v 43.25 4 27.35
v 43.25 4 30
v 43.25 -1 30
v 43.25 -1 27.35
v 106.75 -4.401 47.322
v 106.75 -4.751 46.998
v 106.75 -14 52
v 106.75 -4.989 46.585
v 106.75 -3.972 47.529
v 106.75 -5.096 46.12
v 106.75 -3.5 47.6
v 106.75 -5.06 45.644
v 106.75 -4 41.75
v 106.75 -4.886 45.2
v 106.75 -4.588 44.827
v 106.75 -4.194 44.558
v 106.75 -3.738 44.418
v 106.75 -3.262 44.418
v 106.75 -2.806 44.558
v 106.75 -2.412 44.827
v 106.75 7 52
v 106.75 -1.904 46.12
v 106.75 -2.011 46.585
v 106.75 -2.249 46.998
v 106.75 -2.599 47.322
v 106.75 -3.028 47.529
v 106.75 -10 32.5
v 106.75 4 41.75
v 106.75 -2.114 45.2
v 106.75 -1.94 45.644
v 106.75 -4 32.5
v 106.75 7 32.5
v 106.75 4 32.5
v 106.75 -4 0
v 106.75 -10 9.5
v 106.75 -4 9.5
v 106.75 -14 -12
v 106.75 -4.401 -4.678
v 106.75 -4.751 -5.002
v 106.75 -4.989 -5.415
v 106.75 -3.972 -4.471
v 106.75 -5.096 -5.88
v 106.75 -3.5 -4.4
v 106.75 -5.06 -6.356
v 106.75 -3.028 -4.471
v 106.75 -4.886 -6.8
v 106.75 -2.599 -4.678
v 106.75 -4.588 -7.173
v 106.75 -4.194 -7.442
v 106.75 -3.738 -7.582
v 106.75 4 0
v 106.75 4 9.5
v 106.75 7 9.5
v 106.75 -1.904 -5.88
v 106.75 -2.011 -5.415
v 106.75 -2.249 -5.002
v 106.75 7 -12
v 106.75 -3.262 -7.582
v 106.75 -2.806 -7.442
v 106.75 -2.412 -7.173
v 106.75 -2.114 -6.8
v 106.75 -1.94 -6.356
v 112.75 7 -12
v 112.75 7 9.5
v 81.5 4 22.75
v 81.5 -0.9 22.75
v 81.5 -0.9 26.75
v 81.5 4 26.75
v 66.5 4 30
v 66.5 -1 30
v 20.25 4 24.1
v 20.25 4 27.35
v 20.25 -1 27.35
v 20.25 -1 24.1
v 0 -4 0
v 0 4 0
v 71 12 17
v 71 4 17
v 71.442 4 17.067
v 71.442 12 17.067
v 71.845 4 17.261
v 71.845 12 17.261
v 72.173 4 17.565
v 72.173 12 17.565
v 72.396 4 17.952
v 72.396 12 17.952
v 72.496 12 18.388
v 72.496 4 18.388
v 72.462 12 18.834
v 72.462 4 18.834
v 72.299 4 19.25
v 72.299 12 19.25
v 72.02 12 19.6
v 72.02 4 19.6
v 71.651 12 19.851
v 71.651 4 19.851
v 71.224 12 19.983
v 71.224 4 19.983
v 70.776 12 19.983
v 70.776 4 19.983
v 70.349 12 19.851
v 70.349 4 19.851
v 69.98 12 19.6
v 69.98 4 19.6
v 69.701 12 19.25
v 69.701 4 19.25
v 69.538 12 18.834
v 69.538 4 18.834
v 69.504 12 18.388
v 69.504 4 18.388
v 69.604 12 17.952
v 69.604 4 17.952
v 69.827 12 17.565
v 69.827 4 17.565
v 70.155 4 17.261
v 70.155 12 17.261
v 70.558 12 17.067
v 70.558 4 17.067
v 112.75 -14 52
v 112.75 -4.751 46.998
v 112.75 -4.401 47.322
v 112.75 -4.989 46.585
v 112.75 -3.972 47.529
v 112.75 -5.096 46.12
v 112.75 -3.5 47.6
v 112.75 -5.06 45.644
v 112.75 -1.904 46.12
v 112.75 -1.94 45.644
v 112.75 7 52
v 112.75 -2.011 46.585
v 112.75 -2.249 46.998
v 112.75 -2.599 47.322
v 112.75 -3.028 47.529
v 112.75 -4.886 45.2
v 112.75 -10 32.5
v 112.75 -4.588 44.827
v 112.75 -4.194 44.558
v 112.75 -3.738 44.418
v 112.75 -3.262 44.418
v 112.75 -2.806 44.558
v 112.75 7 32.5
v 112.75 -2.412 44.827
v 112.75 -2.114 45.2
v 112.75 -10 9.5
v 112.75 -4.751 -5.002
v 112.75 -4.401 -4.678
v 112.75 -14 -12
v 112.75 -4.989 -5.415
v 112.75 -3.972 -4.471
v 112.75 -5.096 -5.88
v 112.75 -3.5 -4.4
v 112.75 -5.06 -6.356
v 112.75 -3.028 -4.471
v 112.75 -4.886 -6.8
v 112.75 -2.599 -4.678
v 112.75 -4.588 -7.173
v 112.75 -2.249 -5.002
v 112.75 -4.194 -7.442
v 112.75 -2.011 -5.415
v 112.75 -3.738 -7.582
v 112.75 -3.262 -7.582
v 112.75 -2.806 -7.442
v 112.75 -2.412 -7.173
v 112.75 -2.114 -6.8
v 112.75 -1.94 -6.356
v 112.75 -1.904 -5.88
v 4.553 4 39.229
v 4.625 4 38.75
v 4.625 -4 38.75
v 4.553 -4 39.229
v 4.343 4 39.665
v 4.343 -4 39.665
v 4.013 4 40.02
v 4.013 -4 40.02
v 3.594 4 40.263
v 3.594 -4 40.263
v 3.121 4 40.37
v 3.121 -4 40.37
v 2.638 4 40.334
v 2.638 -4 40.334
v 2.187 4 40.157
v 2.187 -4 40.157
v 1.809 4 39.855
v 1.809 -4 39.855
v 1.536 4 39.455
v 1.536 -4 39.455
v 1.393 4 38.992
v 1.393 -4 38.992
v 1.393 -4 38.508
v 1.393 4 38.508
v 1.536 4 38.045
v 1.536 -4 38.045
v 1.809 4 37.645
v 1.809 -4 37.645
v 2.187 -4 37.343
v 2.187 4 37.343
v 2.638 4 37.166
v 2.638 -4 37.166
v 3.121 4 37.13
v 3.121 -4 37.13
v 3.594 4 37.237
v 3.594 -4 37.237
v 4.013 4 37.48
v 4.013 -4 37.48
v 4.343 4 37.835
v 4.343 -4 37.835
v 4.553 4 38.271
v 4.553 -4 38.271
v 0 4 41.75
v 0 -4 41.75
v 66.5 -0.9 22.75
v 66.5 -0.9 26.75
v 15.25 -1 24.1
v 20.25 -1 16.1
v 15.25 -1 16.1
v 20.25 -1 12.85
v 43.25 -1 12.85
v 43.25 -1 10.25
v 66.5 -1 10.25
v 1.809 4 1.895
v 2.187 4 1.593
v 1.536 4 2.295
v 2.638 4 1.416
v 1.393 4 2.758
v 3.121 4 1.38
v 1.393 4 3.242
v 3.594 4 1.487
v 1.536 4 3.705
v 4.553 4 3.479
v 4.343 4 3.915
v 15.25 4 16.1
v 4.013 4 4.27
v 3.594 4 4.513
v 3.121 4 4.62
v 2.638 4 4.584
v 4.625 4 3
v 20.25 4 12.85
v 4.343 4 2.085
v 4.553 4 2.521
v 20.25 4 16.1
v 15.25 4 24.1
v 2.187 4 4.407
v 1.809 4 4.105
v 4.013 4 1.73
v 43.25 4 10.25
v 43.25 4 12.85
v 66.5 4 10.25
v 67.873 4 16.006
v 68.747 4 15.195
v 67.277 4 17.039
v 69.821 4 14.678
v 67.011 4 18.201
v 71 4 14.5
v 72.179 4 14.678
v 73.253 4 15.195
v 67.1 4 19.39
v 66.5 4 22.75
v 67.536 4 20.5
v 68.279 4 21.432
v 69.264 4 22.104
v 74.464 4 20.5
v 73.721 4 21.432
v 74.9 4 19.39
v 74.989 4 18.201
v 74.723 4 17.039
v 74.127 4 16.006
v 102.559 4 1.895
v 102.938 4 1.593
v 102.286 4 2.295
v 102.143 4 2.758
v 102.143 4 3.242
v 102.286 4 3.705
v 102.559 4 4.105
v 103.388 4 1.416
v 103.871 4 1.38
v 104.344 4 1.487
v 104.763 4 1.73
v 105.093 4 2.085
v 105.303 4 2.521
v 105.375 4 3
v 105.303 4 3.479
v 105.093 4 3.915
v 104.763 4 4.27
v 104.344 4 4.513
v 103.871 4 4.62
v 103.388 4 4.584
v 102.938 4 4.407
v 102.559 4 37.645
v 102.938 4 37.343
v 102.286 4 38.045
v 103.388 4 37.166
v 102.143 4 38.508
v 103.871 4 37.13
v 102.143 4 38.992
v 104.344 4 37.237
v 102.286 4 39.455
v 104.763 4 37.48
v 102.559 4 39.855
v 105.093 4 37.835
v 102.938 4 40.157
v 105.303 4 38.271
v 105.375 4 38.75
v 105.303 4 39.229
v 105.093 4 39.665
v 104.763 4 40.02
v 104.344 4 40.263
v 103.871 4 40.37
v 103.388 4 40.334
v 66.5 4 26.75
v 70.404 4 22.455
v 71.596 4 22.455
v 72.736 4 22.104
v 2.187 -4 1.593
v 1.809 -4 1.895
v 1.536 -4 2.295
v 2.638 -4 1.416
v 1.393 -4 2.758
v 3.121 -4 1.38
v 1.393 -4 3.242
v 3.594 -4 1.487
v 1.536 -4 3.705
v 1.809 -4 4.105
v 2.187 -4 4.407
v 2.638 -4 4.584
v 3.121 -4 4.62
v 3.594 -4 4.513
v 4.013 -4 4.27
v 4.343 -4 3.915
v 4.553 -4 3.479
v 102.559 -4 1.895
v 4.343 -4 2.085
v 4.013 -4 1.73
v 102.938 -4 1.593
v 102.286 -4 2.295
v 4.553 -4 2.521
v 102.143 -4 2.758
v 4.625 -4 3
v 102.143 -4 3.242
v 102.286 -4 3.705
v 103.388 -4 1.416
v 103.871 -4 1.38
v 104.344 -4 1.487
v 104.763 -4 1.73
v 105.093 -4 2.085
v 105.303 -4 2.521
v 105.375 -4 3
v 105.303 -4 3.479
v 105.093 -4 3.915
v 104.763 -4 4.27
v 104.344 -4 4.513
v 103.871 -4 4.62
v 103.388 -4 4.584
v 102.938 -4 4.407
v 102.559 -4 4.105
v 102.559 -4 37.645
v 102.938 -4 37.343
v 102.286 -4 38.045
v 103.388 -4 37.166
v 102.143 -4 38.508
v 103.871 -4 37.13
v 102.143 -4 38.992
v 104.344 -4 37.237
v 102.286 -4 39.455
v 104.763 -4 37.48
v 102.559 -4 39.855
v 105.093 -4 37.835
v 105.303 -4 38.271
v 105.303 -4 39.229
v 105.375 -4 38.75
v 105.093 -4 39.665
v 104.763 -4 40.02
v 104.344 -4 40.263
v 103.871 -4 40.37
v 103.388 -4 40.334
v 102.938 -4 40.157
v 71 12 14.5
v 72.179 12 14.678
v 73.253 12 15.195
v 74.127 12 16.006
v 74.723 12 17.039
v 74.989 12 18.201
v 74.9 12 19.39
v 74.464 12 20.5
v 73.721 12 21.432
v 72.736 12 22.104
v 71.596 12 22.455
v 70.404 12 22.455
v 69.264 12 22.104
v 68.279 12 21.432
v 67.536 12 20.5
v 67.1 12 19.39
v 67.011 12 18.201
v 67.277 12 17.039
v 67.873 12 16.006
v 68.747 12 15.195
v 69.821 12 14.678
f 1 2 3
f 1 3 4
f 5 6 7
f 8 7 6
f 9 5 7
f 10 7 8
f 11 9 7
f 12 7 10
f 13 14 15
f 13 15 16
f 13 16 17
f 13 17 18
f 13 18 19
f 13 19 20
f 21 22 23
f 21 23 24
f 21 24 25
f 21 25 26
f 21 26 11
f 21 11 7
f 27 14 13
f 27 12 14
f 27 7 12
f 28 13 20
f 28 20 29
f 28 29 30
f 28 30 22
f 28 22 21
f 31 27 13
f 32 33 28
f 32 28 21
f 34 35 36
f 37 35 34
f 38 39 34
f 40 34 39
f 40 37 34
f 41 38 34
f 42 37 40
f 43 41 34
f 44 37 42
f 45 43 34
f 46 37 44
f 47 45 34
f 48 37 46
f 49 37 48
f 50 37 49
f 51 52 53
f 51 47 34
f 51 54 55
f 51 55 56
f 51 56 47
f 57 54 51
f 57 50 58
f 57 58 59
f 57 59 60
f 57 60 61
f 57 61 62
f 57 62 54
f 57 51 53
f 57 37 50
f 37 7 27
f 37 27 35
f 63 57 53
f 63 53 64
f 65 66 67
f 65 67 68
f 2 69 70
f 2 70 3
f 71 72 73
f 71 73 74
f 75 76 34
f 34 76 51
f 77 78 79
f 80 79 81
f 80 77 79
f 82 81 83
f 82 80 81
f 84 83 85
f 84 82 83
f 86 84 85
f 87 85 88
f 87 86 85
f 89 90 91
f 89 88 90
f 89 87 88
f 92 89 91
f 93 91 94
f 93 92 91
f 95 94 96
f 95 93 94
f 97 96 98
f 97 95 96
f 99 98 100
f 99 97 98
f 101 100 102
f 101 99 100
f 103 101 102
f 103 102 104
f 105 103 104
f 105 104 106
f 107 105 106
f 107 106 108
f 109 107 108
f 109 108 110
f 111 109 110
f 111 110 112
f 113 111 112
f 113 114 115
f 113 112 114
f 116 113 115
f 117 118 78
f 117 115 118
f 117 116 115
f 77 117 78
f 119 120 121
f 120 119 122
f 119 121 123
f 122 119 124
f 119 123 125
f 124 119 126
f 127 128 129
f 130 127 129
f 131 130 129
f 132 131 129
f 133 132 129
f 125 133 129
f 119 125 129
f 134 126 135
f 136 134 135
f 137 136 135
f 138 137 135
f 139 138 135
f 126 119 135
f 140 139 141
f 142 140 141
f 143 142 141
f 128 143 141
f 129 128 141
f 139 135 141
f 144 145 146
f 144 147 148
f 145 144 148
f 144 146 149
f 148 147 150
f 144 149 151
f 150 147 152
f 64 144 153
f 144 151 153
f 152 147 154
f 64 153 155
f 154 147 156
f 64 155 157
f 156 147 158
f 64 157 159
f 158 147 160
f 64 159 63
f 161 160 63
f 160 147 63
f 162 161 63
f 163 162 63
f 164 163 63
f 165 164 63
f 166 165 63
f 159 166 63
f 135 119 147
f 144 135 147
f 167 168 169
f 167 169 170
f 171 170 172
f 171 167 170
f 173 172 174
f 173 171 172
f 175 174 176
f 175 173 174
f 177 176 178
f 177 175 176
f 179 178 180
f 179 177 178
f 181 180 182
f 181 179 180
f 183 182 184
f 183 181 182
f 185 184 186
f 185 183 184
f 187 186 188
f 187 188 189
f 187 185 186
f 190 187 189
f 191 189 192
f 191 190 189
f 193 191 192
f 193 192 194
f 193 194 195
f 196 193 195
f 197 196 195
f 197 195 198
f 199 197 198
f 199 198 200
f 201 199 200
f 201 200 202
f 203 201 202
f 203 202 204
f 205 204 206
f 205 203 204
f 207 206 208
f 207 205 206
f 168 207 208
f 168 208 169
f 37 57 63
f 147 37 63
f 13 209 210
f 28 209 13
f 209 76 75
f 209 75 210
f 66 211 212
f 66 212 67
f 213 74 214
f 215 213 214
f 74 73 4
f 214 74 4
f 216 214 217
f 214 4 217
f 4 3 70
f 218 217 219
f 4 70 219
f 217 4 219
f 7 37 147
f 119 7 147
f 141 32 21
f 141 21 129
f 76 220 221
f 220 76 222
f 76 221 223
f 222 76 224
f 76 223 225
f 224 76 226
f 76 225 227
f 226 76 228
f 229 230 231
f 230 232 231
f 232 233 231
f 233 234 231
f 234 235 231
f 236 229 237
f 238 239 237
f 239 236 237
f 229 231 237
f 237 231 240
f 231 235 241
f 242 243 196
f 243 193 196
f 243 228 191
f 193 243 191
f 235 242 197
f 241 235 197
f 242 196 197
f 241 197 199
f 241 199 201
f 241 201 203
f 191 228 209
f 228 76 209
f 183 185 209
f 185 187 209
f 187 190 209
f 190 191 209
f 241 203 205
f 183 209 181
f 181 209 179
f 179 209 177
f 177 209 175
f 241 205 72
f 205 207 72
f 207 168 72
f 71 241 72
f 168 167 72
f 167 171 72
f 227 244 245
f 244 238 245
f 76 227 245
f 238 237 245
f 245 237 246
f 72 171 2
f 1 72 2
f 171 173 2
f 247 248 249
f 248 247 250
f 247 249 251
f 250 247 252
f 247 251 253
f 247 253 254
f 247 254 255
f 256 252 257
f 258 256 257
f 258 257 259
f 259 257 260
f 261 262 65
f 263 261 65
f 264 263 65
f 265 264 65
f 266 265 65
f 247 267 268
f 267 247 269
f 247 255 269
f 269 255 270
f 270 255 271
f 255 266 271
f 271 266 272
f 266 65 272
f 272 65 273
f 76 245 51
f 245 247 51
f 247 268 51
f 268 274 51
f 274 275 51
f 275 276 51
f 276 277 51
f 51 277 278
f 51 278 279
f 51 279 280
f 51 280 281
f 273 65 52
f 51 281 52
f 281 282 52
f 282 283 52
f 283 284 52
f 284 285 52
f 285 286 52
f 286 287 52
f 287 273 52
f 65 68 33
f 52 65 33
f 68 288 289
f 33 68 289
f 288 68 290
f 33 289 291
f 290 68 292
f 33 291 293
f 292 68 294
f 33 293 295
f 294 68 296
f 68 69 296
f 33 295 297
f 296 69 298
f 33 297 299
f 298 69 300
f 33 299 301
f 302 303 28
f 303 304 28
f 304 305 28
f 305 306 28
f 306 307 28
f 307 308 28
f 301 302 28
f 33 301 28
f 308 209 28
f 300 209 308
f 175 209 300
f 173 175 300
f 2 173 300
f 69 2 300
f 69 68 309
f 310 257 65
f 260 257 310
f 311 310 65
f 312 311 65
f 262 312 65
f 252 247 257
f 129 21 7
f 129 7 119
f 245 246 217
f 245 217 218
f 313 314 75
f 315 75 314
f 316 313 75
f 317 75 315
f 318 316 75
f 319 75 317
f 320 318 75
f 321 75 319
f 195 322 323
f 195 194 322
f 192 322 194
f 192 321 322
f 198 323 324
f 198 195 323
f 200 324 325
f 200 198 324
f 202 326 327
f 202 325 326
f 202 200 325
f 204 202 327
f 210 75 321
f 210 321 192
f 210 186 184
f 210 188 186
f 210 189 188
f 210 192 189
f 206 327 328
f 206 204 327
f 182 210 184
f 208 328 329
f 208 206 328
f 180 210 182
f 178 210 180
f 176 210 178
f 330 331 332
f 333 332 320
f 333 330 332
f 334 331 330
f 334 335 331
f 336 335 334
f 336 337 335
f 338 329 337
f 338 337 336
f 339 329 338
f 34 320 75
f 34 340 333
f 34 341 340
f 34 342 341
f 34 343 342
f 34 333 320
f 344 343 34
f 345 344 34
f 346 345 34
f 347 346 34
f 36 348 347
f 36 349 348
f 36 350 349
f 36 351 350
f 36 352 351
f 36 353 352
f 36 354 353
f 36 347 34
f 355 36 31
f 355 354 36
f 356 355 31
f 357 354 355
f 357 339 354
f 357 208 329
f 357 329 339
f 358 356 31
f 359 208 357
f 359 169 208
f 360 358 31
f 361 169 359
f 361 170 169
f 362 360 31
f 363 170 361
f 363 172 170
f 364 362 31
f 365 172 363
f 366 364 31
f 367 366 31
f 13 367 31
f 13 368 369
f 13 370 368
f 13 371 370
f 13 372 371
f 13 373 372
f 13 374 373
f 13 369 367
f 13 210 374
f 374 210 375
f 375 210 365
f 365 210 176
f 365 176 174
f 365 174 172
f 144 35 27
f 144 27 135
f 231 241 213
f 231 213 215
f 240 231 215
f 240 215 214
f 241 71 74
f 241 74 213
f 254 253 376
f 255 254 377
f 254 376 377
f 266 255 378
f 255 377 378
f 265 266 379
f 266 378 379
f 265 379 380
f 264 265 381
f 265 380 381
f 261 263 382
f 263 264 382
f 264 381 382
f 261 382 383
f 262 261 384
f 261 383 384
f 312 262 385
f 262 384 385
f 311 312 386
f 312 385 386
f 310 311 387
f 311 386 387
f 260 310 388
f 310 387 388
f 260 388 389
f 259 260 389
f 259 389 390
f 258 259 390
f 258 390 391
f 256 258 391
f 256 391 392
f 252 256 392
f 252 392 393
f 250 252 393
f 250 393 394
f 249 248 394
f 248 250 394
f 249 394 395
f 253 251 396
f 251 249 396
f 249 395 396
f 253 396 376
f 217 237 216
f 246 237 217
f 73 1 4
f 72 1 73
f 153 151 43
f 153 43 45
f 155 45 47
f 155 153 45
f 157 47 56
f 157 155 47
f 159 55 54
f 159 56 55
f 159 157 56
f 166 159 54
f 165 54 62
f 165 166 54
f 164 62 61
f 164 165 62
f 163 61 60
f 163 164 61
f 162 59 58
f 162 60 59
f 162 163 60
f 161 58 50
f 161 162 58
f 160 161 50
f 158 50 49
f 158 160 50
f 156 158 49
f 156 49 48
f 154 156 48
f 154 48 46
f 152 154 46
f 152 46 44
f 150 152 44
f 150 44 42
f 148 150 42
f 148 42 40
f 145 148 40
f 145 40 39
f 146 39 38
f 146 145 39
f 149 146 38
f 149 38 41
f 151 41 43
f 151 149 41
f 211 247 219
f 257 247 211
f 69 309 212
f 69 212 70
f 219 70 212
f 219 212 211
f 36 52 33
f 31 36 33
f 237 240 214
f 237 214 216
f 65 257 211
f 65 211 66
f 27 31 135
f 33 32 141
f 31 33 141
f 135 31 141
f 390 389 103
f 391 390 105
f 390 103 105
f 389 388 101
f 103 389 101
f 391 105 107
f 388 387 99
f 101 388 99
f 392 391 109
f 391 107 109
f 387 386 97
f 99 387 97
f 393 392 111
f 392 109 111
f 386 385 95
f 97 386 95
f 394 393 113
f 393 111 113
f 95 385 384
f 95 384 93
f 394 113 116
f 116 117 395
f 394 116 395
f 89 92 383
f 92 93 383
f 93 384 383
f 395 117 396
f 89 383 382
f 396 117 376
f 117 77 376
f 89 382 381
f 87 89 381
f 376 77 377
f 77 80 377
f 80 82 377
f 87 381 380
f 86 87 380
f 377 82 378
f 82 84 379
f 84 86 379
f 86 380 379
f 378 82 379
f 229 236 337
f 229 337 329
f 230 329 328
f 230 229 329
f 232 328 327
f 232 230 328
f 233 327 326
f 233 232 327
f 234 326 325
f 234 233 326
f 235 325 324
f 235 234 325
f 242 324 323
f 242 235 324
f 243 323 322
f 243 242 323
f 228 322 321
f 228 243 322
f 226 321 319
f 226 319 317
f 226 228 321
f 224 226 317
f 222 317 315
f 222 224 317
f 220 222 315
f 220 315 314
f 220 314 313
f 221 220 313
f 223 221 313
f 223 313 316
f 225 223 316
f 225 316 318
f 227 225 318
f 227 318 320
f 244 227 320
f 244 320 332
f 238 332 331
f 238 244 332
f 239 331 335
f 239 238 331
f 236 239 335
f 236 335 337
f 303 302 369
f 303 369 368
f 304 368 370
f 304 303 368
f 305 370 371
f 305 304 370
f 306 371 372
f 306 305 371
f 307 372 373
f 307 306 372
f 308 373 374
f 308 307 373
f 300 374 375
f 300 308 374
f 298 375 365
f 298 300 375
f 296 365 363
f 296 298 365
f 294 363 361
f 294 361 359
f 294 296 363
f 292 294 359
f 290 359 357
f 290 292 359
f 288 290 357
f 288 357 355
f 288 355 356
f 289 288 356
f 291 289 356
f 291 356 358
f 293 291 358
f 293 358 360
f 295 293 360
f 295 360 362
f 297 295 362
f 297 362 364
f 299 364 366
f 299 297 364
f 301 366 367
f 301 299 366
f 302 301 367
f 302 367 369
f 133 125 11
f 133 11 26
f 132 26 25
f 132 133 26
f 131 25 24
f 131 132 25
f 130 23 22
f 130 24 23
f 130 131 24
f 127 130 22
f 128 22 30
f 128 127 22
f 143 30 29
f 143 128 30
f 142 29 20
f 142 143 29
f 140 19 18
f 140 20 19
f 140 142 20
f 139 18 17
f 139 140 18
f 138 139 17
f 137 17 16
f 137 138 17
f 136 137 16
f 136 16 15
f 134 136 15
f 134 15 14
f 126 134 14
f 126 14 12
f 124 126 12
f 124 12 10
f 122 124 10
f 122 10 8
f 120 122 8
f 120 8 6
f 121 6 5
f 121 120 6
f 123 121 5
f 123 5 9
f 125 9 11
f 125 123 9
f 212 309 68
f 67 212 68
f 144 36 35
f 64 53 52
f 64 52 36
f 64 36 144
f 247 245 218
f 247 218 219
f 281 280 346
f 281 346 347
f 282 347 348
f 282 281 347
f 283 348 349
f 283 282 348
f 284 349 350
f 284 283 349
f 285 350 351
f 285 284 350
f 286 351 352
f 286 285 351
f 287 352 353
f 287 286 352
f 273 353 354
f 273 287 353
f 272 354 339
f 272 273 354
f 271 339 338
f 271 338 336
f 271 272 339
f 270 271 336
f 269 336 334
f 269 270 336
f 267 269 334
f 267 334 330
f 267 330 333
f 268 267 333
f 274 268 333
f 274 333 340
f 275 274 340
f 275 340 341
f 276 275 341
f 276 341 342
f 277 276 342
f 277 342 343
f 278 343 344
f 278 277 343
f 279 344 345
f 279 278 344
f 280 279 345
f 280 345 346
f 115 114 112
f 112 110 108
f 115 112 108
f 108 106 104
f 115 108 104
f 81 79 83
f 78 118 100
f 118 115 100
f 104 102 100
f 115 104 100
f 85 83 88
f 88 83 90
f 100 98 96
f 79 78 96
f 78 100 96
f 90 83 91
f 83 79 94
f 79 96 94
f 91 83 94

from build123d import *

# Parameters (mm, degrees)
BOX011_W                   = 15
BOX011_H                   = 6
BOX011_DEPTH               = 4
EXTRUDE003_DEPTH           = 5
EXTRUDE003_ROLL_ANGLE      = -90
EXTRUDE003_PLACEMENT_ANGLE = -90
CYLINDER010_R              = 1.6
CYLINDER010_DEPTH          = 10
CYLINDER009_R              = 1.6
CYLINDER009_DEPTH          = 10
SKETCH_W                   = 106.75
SKETCH_H                   = 41.75
SKETCH_R                   = 1.625
EXTRUDE_DEPTH              = 8
EXTRUDE_PLACEMENT_ANGLE    = 270
BOX009_W                   = 6
BOX009_H                   = 17
BOX009_DEPTH               = 23
BOX005_W                   = 6
BOX005_H                   = 21
BOX005_DEPTH               = 64
TUBE003_R                  = 4
TUBE003_R_2                = 1.5
TUBE003_DEPTH              = 12


with BuildPart() as cube007:
    # Box011 → Box011 (new body)
    with BuildSketch(Plane(origin=(66.5, -0.9, 22.75), x_dir=(1, 0, 0), z_dir=(0, 0, 1))):
        with Locations((7.5, 3)):
            Rectangle(BOX011_W, BOX011_H)
    extrude(amount=BOX011_DEPTH)


with BuildPart() as extrude003:
    # Sketch004 → Extrude003 (new body)
    with BuildSketch(Plane.YZ):
        Polygon((10.25, 66.5), (10.25, 43.25), (12.9, 43.25), (12.9, 20.25), (16.15, 20.25), (16.15, 15.25), (24.15, 15.25), (24.15, 20.25), (27.4, 20.25), (27.4, 43.25), (30, 43.25), (30, 66.5), align=None)
    extrude(amount=EXTRUDE003_DEPTH)


with BuildPart() as extrude003_1:
    # Extrude003 roll: moved
    add(extrude003.part.rotate(Axis((0, 0, 0), (1, 0, 0)), EXTRUDE003_ROLL_ANGLE))


with BuildPart() as extrude003_2:
    # Extrude003 placement: moved
    add(extrude003_1.part.moved(Location((0, 4, 40.25))).rotate(Axis((0, 4, 40.25), (0, 0, 1)), EXTRUDE003_PLACEMENT_ANGLE))


with BuildPart() as cylinder010:
    # Cylinder010 → Cylinder010 (new body)
    with BuildSketch(Plane(origin=(114, 6.5, 46), x_dir=(0, 0, 1), z_dir=(-1, 0, 0))):
        Circle(CYLINDER010_R)
    extrude(amount=CYLINDER010_DEPTH)


with BuildPart() as m3cyl:
    # Cylinder009 → Cylinder009 (new body)
    with BuildSketch(Plane(origin=(114, 6.5, -6), x_dir=(0, 0, 1), z_dir=(-1, 0, 0))):
        Circle(CYLINDER009_R)
    extrude(amount=CYLINDER009_DEPTH)

    # Fusion010: union Cylinder010
    add(cylinder010.part)


with BuildPart() as m3cyl_1:
    # Fusion010 placement: moved
    add(m3cyl.part.moved(Location((0, -10, 0))))


with BuildPart() as bottom:
    # Sketch → Extrude (new body)
    with BuildSketch(Plane.YZ):
        with Locations((53.375, 20.875)):
            Rectangle(SKETCH_W, SKETCH_H)
        with Locations((3, 3)):
            Circle(SKETCH_R, mode=Mode.SUBTRACT)
        with Locations((3, 38.75)):
            Circle(SKETCH_R, mode=Mode.SUBTRACT)
        with Locations((103.75, 38.75)):
            Circle(SKETCH_R, mode=Mode.SUBTRACT)
        with Locations((103.75, 3)):
            Circle(SKETCH_R, mode=Mode.SUBTRACT)
    extrude(amount=EXTRUDE_DEPTH)


with BuildPart() as bottom_1:
    # Extrude placement: moved
    add(bottom.part.moved(Location((0, 4, 0))).rotate(Axis((0, 4, 0), (0, 0, 1)), EXTRUDE_PLACEMENT_ANGLE))


with BuildPart() as basemount001:
    # Box009 → Box009 (new body)
    with BuildSketch(Plane(origin=(106.75, 0, 9.5), x_dir=(1, 0, 0), z_dir=(0, 0, 1))):
        with Locations((3, 8.5)):
            Rectangle(BOX009_W, BOX009_H)
    extrude(amount=BOX009_DEPTH)


with BuildPart() as lora_cut:
    # Box005 → Box005 (new body)
    with BuildSketch(Plane(origin=(106.75, -4, -12), x_dir=(1, 0, 0), z_dir=(0, 0, 1))):
        with Locations((3, 10.5)):
            Rectangle(BOX005_W, BOX005_H)
    extrude(amount=BOX005_DEPTH)

    # Cut001: cut baseMOunt001
    add(basemount001.part, mode=Mode.SUBTRACT)


with BuildPart() as lora_cut_1:
    # Cut001 placement: moved
    add(lora_cut.part.moved(Location((0, -10, 0))))

    # Fusion009: union Bottom
    add(bottom_1.part)

    # Cut002: cut m3Cyl
    add(m3cyl_1.part, mode=Mode.SUBTRACT)

    # Cut003: cut Extrude003
    add(extrude003_2.part, mode=Mode.SUBTRACT)

    # Cut004: cut Cube007
    add(cube007.part, mode=Mode.SUBTRACT)


with BuildPart() as bottom001:
    # Tube003 → Tube003 (new body)
    with BuildSketch(Plane(origin=(71, 12, 18.5), x_dir=(0, 0, -1), z_dir=(0, -1, 0))):
        Circle(TUBE003_R)
        Circle(TUBE003_R_2, mode=Mode.SUBTRACT)
    extrude(amount=TUBE003_DEPTH)

    # Fusion011: union LoRa_Cut
    add(lora_cut_1.part)


solid = bottom001.part
